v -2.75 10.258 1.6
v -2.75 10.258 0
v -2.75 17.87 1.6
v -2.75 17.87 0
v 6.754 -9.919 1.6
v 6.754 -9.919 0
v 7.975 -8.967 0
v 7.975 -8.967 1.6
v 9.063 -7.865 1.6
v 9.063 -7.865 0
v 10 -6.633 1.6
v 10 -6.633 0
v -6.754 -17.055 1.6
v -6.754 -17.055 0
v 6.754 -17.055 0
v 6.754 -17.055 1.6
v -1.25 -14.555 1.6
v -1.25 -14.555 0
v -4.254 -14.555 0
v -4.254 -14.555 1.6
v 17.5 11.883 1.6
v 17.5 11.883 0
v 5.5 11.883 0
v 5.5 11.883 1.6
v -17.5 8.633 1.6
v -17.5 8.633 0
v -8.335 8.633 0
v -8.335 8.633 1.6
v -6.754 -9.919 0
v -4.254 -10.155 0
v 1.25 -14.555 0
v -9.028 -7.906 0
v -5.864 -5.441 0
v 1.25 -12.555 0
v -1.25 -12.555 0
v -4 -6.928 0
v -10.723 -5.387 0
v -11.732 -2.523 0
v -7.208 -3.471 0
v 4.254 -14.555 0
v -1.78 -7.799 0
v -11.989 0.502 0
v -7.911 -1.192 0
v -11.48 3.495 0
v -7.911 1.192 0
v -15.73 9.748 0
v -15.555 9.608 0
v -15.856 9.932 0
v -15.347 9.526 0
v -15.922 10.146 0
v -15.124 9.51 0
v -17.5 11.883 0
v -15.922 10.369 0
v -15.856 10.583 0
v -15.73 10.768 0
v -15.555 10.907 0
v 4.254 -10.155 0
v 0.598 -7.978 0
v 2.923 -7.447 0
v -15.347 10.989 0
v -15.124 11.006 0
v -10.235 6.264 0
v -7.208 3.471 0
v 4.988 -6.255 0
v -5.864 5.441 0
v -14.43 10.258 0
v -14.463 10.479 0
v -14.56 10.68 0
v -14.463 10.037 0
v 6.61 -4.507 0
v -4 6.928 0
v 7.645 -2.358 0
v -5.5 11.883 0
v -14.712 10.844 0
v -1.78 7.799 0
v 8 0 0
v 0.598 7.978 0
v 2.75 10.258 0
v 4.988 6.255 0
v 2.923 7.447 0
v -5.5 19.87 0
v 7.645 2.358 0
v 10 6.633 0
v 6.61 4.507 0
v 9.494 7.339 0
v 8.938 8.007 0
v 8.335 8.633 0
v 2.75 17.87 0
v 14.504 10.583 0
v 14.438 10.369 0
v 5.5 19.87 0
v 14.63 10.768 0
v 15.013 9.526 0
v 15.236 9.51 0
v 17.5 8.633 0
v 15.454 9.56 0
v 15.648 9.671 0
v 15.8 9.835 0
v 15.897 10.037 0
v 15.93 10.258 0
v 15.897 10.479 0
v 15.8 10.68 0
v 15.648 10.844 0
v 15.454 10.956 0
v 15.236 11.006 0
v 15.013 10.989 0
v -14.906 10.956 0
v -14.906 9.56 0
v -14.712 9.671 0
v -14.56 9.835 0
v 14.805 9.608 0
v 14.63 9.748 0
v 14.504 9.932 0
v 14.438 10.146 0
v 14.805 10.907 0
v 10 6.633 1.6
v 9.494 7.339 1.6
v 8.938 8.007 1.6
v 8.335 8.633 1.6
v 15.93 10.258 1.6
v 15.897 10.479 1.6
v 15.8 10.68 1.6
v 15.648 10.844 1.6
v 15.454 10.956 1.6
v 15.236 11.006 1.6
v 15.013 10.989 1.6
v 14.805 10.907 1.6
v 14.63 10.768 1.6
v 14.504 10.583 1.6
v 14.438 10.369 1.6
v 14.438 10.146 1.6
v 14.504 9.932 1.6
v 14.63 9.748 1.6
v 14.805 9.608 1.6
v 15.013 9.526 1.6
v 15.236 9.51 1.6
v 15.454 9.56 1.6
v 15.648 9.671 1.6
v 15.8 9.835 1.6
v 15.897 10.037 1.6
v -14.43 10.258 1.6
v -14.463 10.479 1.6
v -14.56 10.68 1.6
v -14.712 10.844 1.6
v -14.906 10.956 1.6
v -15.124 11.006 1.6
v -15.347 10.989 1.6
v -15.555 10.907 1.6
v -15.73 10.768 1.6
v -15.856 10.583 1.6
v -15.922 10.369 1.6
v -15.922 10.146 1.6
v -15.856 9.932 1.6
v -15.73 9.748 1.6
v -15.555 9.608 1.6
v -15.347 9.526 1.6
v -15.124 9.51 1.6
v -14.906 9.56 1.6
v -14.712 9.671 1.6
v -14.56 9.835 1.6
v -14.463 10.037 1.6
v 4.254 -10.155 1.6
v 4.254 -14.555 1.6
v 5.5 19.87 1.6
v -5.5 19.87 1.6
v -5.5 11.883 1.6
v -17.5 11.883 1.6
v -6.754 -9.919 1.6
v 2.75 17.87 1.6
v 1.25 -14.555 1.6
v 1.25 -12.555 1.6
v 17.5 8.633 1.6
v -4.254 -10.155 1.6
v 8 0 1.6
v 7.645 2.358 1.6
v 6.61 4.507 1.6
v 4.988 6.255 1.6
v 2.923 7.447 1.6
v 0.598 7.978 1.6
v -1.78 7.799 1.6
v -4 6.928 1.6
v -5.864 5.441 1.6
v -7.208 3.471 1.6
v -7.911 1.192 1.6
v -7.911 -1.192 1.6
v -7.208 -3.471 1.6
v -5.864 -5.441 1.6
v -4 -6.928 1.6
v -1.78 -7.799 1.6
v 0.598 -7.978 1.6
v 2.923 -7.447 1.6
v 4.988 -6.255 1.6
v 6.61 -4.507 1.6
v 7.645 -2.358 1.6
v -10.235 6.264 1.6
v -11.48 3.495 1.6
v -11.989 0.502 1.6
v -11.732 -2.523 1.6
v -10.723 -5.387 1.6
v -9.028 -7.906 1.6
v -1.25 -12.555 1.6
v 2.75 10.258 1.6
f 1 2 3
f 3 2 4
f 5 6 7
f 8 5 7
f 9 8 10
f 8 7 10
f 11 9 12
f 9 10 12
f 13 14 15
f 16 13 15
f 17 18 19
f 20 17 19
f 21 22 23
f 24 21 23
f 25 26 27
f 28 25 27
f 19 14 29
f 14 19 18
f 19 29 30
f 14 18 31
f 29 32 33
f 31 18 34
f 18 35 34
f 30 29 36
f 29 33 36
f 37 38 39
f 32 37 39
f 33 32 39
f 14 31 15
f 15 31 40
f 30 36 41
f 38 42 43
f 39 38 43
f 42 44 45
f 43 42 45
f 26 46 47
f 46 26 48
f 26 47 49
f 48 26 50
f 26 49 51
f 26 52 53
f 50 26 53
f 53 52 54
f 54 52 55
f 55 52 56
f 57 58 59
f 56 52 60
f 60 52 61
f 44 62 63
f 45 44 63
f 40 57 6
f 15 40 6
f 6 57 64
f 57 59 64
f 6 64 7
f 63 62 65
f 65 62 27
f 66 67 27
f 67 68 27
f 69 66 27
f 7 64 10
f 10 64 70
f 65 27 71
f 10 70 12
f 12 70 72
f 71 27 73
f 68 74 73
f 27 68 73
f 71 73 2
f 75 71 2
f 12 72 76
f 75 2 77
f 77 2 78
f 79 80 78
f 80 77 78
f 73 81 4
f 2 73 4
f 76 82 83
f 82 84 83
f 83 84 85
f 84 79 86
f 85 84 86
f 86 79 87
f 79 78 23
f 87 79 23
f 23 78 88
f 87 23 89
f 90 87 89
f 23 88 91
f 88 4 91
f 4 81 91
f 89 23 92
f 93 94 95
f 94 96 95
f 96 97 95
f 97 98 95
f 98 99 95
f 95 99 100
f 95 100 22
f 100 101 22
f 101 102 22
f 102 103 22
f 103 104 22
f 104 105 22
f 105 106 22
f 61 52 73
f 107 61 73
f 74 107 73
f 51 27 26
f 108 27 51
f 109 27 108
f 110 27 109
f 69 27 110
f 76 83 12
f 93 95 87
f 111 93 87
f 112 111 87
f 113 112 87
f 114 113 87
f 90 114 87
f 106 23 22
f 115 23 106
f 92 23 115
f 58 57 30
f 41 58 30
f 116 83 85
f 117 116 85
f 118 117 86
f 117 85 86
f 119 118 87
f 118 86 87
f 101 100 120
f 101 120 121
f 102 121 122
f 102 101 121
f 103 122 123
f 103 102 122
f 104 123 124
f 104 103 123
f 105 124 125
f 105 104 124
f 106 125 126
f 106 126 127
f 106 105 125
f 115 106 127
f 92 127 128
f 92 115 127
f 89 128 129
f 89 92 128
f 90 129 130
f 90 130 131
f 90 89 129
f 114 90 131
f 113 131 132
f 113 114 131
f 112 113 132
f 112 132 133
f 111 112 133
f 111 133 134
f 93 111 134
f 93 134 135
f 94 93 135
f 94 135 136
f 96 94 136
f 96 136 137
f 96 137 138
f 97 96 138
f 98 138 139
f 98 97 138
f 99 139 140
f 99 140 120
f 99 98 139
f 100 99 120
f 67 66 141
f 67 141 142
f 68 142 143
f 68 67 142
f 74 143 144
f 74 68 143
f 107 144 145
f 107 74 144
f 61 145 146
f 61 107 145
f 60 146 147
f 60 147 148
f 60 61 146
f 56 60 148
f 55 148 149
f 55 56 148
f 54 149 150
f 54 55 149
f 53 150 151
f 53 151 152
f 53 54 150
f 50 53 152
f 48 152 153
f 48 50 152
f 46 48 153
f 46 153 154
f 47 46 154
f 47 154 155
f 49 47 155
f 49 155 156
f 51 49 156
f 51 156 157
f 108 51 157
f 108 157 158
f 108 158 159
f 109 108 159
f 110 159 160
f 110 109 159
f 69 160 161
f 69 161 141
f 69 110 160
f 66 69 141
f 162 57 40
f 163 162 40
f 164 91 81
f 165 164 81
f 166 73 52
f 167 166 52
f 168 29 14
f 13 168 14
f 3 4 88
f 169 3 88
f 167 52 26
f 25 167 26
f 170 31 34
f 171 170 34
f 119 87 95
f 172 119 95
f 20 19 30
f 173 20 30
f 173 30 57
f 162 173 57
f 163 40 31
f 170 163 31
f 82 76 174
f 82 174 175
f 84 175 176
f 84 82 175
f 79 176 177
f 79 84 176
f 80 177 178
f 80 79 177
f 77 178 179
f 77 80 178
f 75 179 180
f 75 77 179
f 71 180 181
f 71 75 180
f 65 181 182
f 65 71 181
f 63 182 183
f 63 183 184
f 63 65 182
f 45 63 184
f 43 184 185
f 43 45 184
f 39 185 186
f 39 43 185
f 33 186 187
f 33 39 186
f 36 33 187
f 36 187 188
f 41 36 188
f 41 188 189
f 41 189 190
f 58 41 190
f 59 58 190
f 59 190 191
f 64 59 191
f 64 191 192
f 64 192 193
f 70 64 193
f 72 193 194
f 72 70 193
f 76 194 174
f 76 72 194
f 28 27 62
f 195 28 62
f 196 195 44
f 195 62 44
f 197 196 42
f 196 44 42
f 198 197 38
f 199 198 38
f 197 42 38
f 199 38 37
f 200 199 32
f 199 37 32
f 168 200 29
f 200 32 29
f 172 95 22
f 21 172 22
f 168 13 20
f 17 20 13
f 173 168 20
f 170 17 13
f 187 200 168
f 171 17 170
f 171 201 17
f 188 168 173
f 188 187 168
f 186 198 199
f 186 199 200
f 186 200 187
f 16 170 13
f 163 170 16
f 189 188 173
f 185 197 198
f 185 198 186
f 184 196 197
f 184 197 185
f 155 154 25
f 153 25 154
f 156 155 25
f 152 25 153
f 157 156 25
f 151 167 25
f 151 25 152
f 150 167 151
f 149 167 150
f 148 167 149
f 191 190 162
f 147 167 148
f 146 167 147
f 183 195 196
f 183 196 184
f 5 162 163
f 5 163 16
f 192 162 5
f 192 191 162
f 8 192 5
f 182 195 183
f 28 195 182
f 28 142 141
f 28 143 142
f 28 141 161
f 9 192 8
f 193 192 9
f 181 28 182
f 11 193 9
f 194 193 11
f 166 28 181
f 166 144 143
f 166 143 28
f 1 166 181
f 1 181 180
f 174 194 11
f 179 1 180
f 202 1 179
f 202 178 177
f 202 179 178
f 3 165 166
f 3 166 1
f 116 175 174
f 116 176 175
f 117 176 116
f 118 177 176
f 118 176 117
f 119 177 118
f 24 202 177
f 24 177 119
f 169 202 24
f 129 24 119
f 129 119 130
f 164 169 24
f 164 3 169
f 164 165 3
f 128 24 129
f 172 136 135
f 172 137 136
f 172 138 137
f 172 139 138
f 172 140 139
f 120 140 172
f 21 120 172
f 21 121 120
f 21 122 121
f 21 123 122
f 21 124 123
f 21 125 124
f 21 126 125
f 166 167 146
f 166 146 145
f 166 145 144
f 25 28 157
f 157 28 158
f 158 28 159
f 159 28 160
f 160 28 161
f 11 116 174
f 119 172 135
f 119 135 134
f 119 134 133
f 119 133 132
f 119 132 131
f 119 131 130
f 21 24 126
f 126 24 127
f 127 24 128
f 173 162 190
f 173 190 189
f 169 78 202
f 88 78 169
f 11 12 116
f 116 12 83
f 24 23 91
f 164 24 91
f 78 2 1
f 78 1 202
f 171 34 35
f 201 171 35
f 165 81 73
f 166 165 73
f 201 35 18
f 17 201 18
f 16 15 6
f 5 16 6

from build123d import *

# Parameters (mm, degrees)
SKETCH1_W           = 5.5
SKETCH1_H           = 7.612305333
SKETCH1_R           = 0.75
SKETCH1_R_2         = 8
BOSS_EXTRUDE1_DEPTH = 1.6


with BuildPart() as part:
    # Sketch1 → Boss-Extrude1 (new body)
    with BuildSketch(Plane.XY):
        with BuildLine():
            Line((5.5, 19.87), (-5.5, 19.87))
            Line((-5.5, 19.87), (-5.5, 11.882694667))
            Line((-5.5, 11.882694667), (-17.5, 11.882694667))
            Line((-17.5, 11.882694667), (-17.5, 8.632694667))
            Line((-17.5, 8.632694667), (-8.335261411, 8.632694667))
            ThreePointArc((-8.335261411, 8.632694667), (-11.956670593, -1.018836756), (-6.7545, -9.918504411))
            Line((-6.7545, -9.918504411), (-6.7545, -17.054889955))
            Line((-6.7545, -17.054889955), (6.7545, -17.054889955))
            Line((6.7545, -17.054889955), (6.7545, -9.918504411))
            ThreePointArc((6.7545, -9.918504411), (8.536775878, -8.433472453), (10, -6.633249581))
            Line((10, -6.633249581), (10, 6.633249581))
            ThreePointArc((10, 6.633249581), (9.221979067, 7.678222586), (8.335261411, 8.632694667))
            Line((8.335261411, 8.632694667), (17.5, 8.632694667))
            Line((17.5, 8.632694667), (17.5, 11.882694667))
            Line((17.5, 11.882694667), (5.5, 11.882694667))
            Line((5.5, 11.882694667), (5.5, 19.87))
        make_face()
        with Locations((0, 14.063847334)):
            Rectangle(SKETCH1_W, SKETCH1_H, mode=Mode.SUBTRACT)
        Polygon((-4.2545, -10.154889955), (4.2545, -10.154889955), (4.2545, -14.554889955), (1.25, -14.554889955), (1.25, -12.554889955), (-1.25, -12.554889955), (-1.25, -14.554889955), (-4.2545, -14.554889955), align=None, mode=Mode.SUBTRACT)
        with Locations((-15.18, 10.257694667)):
            Circle(SKETCH1_R, mode=Mode.SUBTRACT)
        Circle(SKETCH1_R_2, mode=Mode.SUBTRACT)
        with Locations((15.18, 10.257694667)):
            Circle(SKETCH1_R, mode=Mode.SUBTRACT)
    extrude(amount=BOSS_EXTRUDE1_DEPTH)


solid = part.part
